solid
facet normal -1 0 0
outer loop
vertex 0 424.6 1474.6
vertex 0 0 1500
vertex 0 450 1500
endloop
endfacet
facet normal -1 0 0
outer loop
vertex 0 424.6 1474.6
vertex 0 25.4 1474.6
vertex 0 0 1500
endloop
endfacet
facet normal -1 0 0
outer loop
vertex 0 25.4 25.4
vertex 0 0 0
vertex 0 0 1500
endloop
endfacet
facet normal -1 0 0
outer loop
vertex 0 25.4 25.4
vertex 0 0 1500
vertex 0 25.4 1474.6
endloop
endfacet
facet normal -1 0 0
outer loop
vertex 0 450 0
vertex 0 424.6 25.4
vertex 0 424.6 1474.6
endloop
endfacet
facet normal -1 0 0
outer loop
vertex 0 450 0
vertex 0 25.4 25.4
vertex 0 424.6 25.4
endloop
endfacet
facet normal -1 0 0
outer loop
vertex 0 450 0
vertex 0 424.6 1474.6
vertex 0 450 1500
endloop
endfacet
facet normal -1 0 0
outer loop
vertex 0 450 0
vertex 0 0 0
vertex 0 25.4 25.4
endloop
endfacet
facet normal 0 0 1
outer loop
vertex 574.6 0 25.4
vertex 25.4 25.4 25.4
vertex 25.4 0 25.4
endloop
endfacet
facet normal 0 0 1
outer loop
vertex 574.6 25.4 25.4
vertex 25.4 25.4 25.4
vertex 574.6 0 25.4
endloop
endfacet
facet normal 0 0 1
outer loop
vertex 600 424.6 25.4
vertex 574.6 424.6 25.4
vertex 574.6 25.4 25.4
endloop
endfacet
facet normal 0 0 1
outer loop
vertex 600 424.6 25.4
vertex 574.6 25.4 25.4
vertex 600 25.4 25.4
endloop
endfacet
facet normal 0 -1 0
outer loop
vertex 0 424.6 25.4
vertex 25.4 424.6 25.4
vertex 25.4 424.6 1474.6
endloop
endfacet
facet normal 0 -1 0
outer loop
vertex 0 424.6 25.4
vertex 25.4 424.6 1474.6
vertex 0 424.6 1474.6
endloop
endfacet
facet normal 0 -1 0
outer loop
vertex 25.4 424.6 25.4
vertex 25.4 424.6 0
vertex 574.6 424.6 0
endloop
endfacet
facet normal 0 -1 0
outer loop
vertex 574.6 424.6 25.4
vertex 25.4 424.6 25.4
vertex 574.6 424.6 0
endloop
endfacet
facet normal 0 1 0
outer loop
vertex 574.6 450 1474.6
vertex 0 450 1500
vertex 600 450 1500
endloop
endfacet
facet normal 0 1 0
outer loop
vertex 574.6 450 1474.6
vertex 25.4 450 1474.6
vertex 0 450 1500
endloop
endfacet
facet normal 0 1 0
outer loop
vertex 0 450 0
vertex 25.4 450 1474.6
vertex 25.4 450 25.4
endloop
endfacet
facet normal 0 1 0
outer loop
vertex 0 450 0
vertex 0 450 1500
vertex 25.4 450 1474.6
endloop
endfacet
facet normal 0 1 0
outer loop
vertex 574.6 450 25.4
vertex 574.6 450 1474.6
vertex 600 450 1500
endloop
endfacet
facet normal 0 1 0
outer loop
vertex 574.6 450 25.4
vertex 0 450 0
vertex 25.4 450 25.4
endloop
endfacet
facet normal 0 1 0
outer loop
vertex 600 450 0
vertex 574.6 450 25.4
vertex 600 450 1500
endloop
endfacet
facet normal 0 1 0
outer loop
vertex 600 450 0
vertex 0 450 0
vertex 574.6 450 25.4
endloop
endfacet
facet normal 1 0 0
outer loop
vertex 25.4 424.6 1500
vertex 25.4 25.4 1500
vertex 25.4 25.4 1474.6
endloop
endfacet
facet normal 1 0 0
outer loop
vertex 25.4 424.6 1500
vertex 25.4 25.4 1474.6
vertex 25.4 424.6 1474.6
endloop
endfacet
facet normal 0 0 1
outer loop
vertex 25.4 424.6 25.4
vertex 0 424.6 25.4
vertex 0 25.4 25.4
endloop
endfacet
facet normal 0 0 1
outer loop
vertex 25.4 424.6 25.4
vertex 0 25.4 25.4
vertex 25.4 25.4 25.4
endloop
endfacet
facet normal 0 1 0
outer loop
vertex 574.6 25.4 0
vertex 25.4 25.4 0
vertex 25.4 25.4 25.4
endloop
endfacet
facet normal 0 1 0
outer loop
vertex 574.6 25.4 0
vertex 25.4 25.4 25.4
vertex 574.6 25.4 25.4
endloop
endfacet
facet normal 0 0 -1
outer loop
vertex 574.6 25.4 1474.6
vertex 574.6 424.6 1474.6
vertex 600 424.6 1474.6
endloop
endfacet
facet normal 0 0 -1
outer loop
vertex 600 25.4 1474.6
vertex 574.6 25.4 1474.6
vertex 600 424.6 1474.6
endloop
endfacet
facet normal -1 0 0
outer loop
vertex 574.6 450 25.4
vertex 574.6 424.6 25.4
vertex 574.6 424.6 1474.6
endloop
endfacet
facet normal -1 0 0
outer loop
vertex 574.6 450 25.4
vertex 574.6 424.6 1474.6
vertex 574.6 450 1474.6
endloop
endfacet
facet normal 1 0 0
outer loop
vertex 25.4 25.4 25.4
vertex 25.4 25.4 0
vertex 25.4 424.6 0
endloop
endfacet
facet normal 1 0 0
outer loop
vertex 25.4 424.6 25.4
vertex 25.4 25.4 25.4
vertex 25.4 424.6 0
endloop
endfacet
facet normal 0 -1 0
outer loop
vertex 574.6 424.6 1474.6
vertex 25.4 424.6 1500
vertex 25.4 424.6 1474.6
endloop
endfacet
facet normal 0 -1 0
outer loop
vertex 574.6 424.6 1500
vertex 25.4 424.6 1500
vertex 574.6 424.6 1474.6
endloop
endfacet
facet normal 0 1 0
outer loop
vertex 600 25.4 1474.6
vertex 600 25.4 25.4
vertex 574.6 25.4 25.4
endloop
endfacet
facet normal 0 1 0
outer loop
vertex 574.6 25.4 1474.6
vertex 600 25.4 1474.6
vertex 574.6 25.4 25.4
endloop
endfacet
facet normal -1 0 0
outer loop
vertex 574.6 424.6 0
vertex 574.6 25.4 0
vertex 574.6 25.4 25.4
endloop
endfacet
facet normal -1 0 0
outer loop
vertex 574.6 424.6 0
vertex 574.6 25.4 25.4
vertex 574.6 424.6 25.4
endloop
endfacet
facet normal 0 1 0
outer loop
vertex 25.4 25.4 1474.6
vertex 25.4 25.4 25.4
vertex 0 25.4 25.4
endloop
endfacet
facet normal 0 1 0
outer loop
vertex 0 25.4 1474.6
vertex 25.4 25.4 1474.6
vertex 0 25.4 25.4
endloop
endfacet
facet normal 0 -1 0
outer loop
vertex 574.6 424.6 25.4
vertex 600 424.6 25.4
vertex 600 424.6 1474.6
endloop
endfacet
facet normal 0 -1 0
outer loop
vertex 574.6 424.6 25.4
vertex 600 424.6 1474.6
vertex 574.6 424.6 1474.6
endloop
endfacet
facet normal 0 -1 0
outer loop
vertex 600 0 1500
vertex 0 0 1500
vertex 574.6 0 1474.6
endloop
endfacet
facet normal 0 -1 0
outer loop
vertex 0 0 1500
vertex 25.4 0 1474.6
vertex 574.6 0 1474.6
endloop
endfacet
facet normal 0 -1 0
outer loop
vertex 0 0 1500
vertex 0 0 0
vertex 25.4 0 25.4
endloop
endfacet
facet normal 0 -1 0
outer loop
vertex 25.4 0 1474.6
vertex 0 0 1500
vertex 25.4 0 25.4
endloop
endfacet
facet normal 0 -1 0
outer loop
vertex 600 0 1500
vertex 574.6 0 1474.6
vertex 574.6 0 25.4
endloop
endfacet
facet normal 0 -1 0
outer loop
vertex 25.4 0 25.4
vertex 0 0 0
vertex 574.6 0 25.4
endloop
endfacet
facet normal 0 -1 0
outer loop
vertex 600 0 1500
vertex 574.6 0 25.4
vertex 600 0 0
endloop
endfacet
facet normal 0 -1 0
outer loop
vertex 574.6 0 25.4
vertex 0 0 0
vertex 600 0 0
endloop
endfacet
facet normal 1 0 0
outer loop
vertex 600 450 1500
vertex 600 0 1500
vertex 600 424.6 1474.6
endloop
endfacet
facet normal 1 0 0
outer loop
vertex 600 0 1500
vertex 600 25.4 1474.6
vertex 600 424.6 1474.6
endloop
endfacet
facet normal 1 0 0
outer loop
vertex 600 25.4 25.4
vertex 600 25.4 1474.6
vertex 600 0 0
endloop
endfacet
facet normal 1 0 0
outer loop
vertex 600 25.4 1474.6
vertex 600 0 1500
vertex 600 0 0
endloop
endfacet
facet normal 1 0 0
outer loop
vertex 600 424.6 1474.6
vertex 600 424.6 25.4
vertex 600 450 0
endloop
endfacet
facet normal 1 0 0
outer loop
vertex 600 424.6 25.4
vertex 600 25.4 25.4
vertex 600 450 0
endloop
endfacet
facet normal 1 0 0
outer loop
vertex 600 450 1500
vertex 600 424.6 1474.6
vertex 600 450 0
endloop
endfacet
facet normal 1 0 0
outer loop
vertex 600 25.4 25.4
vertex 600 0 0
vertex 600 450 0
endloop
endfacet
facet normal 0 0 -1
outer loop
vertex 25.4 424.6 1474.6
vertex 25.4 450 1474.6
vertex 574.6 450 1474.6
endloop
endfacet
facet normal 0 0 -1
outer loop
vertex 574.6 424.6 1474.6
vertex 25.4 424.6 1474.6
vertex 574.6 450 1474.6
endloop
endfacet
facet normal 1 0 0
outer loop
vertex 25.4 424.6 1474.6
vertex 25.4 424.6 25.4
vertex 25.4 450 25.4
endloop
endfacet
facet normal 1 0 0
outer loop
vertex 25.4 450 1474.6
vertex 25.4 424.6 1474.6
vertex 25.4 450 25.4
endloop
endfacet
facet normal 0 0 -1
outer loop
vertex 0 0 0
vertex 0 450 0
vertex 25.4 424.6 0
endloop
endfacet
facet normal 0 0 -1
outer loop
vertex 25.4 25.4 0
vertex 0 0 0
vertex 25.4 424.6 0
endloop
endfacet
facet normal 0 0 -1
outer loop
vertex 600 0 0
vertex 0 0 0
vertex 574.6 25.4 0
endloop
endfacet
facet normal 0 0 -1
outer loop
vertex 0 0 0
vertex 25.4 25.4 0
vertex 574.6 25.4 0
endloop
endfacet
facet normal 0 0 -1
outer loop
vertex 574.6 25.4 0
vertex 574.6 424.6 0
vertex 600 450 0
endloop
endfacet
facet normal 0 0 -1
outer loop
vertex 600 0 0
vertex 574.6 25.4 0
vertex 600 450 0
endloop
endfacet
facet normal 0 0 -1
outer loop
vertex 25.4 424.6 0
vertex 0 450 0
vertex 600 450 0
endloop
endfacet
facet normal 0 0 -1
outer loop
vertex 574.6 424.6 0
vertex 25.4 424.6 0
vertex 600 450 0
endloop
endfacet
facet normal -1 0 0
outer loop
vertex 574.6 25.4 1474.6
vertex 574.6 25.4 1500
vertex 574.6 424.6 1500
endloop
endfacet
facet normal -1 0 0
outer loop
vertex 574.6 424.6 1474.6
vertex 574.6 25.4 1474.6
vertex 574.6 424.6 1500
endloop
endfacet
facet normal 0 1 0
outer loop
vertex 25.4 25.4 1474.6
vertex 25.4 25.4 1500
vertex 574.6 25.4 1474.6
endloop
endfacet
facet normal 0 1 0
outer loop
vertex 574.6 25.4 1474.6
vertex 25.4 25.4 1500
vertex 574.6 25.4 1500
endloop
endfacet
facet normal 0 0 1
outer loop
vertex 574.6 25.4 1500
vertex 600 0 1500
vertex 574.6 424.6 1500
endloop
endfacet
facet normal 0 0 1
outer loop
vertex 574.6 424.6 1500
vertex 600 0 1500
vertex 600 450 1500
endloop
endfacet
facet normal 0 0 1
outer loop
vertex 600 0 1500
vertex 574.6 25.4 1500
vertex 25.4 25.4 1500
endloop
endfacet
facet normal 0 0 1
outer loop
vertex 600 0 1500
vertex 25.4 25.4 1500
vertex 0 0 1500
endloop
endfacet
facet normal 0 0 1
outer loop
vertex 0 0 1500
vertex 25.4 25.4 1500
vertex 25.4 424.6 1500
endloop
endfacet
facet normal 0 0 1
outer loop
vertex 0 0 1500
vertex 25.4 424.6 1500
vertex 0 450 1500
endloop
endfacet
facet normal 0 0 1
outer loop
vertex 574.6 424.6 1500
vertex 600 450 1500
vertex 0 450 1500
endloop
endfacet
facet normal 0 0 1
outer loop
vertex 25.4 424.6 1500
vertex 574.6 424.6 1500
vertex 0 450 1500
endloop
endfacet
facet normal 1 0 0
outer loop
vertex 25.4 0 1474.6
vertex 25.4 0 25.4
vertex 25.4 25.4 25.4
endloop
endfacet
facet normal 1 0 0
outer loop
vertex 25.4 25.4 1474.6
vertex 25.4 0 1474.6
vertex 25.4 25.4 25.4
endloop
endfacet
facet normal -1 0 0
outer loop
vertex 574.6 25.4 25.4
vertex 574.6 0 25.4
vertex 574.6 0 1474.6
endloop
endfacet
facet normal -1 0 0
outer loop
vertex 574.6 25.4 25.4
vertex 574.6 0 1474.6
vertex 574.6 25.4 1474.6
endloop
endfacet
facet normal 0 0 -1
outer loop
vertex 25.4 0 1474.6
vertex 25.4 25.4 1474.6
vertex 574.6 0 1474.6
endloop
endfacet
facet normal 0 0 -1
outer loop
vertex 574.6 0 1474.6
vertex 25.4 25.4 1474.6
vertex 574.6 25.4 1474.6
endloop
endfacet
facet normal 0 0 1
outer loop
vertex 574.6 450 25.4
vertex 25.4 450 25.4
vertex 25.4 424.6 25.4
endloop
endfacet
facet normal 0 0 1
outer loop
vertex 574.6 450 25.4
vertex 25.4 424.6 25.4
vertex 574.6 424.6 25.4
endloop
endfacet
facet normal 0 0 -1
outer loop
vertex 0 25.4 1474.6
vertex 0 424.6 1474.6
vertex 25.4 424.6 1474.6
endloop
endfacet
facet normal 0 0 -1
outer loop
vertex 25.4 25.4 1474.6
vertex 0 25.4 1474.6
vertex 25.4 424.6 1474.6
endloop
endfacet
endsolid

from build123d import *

# Parameters (mm, degrees)
SKETCH1_W           = 600
SKETCH1_H           = 450
SKETCH1_W_2         = 549.2
SKETCH1_H_2         = 399.2
BOSS_EXTRUDE1_DEPTH = 25.4
SKETCH2_W           = 25.4
SKETCH2_H           = 25.4
BOSS_EXTRUDE2_DEPTH = 1500
SKETCH3_W           = 600
SKETCH3_H           = 450
SKETCH3_W_2         = 549.2
SKETCH3_H_2         = 399.2
BOSS_EXTRUDE3_DEPTH = 25.4


with BuildPart() as part:
    # Sketch1 → Boss-Extrude1 (new body)
    with BuildSketch(Plane.XY):
        with Locations((300, 225)):
            Rectangle(SKETCH1_W, SKETCH1_H)
        with Locations((300, 225)):
            Rectangle(SKETCH1_W_2, SKETCH1_H_2, mode=Mode.SUBTRACT)
    extrude(amount=BOSS_EXTRUDE1_DEPTH)

    # Sketch2 → Boss-Extrude2 (add)
    with BuildSketch(Plane(origin=(0, 0, 0), x_dir=(-1, 0, 0), z_dir=(0, 0, -1))):
        with Locations((-12.7, 437.3)):
            Rectangle(SKETCH2_W, SKETCH2_H)
        with Locations((-587.3, 437.3)):
            Rectangle(SKETCH2_W, SKETCH2_H)
        with Locations((-587.3, 12.7)):
            Rectangle(SKETCH2_W, SKETCH2_H)
        with Locations((-12.7, 12.7)):
            Rectangle(SKETCH2_W, SKETCH2_H)
    extrude(amount=-BOSS_EXTRUDE2_DEPTH)

    # Sketch3 → Boss-Extrude3 (add)
    with BuildSketch(Plane.XY.offset(1500)):
        with Locations((300, 225)):
            Rectangle(SKETCH3_W, SKETCH3_H)
        with Locations((300, 225)):
            Rectangle(SKETCH3_W_2, SKETCH3_H_2, mode=Mode.SUBTRACT)
    extrude(amount=-BOSS_EXTRUDE3_DEPTH)


solid = part.part
